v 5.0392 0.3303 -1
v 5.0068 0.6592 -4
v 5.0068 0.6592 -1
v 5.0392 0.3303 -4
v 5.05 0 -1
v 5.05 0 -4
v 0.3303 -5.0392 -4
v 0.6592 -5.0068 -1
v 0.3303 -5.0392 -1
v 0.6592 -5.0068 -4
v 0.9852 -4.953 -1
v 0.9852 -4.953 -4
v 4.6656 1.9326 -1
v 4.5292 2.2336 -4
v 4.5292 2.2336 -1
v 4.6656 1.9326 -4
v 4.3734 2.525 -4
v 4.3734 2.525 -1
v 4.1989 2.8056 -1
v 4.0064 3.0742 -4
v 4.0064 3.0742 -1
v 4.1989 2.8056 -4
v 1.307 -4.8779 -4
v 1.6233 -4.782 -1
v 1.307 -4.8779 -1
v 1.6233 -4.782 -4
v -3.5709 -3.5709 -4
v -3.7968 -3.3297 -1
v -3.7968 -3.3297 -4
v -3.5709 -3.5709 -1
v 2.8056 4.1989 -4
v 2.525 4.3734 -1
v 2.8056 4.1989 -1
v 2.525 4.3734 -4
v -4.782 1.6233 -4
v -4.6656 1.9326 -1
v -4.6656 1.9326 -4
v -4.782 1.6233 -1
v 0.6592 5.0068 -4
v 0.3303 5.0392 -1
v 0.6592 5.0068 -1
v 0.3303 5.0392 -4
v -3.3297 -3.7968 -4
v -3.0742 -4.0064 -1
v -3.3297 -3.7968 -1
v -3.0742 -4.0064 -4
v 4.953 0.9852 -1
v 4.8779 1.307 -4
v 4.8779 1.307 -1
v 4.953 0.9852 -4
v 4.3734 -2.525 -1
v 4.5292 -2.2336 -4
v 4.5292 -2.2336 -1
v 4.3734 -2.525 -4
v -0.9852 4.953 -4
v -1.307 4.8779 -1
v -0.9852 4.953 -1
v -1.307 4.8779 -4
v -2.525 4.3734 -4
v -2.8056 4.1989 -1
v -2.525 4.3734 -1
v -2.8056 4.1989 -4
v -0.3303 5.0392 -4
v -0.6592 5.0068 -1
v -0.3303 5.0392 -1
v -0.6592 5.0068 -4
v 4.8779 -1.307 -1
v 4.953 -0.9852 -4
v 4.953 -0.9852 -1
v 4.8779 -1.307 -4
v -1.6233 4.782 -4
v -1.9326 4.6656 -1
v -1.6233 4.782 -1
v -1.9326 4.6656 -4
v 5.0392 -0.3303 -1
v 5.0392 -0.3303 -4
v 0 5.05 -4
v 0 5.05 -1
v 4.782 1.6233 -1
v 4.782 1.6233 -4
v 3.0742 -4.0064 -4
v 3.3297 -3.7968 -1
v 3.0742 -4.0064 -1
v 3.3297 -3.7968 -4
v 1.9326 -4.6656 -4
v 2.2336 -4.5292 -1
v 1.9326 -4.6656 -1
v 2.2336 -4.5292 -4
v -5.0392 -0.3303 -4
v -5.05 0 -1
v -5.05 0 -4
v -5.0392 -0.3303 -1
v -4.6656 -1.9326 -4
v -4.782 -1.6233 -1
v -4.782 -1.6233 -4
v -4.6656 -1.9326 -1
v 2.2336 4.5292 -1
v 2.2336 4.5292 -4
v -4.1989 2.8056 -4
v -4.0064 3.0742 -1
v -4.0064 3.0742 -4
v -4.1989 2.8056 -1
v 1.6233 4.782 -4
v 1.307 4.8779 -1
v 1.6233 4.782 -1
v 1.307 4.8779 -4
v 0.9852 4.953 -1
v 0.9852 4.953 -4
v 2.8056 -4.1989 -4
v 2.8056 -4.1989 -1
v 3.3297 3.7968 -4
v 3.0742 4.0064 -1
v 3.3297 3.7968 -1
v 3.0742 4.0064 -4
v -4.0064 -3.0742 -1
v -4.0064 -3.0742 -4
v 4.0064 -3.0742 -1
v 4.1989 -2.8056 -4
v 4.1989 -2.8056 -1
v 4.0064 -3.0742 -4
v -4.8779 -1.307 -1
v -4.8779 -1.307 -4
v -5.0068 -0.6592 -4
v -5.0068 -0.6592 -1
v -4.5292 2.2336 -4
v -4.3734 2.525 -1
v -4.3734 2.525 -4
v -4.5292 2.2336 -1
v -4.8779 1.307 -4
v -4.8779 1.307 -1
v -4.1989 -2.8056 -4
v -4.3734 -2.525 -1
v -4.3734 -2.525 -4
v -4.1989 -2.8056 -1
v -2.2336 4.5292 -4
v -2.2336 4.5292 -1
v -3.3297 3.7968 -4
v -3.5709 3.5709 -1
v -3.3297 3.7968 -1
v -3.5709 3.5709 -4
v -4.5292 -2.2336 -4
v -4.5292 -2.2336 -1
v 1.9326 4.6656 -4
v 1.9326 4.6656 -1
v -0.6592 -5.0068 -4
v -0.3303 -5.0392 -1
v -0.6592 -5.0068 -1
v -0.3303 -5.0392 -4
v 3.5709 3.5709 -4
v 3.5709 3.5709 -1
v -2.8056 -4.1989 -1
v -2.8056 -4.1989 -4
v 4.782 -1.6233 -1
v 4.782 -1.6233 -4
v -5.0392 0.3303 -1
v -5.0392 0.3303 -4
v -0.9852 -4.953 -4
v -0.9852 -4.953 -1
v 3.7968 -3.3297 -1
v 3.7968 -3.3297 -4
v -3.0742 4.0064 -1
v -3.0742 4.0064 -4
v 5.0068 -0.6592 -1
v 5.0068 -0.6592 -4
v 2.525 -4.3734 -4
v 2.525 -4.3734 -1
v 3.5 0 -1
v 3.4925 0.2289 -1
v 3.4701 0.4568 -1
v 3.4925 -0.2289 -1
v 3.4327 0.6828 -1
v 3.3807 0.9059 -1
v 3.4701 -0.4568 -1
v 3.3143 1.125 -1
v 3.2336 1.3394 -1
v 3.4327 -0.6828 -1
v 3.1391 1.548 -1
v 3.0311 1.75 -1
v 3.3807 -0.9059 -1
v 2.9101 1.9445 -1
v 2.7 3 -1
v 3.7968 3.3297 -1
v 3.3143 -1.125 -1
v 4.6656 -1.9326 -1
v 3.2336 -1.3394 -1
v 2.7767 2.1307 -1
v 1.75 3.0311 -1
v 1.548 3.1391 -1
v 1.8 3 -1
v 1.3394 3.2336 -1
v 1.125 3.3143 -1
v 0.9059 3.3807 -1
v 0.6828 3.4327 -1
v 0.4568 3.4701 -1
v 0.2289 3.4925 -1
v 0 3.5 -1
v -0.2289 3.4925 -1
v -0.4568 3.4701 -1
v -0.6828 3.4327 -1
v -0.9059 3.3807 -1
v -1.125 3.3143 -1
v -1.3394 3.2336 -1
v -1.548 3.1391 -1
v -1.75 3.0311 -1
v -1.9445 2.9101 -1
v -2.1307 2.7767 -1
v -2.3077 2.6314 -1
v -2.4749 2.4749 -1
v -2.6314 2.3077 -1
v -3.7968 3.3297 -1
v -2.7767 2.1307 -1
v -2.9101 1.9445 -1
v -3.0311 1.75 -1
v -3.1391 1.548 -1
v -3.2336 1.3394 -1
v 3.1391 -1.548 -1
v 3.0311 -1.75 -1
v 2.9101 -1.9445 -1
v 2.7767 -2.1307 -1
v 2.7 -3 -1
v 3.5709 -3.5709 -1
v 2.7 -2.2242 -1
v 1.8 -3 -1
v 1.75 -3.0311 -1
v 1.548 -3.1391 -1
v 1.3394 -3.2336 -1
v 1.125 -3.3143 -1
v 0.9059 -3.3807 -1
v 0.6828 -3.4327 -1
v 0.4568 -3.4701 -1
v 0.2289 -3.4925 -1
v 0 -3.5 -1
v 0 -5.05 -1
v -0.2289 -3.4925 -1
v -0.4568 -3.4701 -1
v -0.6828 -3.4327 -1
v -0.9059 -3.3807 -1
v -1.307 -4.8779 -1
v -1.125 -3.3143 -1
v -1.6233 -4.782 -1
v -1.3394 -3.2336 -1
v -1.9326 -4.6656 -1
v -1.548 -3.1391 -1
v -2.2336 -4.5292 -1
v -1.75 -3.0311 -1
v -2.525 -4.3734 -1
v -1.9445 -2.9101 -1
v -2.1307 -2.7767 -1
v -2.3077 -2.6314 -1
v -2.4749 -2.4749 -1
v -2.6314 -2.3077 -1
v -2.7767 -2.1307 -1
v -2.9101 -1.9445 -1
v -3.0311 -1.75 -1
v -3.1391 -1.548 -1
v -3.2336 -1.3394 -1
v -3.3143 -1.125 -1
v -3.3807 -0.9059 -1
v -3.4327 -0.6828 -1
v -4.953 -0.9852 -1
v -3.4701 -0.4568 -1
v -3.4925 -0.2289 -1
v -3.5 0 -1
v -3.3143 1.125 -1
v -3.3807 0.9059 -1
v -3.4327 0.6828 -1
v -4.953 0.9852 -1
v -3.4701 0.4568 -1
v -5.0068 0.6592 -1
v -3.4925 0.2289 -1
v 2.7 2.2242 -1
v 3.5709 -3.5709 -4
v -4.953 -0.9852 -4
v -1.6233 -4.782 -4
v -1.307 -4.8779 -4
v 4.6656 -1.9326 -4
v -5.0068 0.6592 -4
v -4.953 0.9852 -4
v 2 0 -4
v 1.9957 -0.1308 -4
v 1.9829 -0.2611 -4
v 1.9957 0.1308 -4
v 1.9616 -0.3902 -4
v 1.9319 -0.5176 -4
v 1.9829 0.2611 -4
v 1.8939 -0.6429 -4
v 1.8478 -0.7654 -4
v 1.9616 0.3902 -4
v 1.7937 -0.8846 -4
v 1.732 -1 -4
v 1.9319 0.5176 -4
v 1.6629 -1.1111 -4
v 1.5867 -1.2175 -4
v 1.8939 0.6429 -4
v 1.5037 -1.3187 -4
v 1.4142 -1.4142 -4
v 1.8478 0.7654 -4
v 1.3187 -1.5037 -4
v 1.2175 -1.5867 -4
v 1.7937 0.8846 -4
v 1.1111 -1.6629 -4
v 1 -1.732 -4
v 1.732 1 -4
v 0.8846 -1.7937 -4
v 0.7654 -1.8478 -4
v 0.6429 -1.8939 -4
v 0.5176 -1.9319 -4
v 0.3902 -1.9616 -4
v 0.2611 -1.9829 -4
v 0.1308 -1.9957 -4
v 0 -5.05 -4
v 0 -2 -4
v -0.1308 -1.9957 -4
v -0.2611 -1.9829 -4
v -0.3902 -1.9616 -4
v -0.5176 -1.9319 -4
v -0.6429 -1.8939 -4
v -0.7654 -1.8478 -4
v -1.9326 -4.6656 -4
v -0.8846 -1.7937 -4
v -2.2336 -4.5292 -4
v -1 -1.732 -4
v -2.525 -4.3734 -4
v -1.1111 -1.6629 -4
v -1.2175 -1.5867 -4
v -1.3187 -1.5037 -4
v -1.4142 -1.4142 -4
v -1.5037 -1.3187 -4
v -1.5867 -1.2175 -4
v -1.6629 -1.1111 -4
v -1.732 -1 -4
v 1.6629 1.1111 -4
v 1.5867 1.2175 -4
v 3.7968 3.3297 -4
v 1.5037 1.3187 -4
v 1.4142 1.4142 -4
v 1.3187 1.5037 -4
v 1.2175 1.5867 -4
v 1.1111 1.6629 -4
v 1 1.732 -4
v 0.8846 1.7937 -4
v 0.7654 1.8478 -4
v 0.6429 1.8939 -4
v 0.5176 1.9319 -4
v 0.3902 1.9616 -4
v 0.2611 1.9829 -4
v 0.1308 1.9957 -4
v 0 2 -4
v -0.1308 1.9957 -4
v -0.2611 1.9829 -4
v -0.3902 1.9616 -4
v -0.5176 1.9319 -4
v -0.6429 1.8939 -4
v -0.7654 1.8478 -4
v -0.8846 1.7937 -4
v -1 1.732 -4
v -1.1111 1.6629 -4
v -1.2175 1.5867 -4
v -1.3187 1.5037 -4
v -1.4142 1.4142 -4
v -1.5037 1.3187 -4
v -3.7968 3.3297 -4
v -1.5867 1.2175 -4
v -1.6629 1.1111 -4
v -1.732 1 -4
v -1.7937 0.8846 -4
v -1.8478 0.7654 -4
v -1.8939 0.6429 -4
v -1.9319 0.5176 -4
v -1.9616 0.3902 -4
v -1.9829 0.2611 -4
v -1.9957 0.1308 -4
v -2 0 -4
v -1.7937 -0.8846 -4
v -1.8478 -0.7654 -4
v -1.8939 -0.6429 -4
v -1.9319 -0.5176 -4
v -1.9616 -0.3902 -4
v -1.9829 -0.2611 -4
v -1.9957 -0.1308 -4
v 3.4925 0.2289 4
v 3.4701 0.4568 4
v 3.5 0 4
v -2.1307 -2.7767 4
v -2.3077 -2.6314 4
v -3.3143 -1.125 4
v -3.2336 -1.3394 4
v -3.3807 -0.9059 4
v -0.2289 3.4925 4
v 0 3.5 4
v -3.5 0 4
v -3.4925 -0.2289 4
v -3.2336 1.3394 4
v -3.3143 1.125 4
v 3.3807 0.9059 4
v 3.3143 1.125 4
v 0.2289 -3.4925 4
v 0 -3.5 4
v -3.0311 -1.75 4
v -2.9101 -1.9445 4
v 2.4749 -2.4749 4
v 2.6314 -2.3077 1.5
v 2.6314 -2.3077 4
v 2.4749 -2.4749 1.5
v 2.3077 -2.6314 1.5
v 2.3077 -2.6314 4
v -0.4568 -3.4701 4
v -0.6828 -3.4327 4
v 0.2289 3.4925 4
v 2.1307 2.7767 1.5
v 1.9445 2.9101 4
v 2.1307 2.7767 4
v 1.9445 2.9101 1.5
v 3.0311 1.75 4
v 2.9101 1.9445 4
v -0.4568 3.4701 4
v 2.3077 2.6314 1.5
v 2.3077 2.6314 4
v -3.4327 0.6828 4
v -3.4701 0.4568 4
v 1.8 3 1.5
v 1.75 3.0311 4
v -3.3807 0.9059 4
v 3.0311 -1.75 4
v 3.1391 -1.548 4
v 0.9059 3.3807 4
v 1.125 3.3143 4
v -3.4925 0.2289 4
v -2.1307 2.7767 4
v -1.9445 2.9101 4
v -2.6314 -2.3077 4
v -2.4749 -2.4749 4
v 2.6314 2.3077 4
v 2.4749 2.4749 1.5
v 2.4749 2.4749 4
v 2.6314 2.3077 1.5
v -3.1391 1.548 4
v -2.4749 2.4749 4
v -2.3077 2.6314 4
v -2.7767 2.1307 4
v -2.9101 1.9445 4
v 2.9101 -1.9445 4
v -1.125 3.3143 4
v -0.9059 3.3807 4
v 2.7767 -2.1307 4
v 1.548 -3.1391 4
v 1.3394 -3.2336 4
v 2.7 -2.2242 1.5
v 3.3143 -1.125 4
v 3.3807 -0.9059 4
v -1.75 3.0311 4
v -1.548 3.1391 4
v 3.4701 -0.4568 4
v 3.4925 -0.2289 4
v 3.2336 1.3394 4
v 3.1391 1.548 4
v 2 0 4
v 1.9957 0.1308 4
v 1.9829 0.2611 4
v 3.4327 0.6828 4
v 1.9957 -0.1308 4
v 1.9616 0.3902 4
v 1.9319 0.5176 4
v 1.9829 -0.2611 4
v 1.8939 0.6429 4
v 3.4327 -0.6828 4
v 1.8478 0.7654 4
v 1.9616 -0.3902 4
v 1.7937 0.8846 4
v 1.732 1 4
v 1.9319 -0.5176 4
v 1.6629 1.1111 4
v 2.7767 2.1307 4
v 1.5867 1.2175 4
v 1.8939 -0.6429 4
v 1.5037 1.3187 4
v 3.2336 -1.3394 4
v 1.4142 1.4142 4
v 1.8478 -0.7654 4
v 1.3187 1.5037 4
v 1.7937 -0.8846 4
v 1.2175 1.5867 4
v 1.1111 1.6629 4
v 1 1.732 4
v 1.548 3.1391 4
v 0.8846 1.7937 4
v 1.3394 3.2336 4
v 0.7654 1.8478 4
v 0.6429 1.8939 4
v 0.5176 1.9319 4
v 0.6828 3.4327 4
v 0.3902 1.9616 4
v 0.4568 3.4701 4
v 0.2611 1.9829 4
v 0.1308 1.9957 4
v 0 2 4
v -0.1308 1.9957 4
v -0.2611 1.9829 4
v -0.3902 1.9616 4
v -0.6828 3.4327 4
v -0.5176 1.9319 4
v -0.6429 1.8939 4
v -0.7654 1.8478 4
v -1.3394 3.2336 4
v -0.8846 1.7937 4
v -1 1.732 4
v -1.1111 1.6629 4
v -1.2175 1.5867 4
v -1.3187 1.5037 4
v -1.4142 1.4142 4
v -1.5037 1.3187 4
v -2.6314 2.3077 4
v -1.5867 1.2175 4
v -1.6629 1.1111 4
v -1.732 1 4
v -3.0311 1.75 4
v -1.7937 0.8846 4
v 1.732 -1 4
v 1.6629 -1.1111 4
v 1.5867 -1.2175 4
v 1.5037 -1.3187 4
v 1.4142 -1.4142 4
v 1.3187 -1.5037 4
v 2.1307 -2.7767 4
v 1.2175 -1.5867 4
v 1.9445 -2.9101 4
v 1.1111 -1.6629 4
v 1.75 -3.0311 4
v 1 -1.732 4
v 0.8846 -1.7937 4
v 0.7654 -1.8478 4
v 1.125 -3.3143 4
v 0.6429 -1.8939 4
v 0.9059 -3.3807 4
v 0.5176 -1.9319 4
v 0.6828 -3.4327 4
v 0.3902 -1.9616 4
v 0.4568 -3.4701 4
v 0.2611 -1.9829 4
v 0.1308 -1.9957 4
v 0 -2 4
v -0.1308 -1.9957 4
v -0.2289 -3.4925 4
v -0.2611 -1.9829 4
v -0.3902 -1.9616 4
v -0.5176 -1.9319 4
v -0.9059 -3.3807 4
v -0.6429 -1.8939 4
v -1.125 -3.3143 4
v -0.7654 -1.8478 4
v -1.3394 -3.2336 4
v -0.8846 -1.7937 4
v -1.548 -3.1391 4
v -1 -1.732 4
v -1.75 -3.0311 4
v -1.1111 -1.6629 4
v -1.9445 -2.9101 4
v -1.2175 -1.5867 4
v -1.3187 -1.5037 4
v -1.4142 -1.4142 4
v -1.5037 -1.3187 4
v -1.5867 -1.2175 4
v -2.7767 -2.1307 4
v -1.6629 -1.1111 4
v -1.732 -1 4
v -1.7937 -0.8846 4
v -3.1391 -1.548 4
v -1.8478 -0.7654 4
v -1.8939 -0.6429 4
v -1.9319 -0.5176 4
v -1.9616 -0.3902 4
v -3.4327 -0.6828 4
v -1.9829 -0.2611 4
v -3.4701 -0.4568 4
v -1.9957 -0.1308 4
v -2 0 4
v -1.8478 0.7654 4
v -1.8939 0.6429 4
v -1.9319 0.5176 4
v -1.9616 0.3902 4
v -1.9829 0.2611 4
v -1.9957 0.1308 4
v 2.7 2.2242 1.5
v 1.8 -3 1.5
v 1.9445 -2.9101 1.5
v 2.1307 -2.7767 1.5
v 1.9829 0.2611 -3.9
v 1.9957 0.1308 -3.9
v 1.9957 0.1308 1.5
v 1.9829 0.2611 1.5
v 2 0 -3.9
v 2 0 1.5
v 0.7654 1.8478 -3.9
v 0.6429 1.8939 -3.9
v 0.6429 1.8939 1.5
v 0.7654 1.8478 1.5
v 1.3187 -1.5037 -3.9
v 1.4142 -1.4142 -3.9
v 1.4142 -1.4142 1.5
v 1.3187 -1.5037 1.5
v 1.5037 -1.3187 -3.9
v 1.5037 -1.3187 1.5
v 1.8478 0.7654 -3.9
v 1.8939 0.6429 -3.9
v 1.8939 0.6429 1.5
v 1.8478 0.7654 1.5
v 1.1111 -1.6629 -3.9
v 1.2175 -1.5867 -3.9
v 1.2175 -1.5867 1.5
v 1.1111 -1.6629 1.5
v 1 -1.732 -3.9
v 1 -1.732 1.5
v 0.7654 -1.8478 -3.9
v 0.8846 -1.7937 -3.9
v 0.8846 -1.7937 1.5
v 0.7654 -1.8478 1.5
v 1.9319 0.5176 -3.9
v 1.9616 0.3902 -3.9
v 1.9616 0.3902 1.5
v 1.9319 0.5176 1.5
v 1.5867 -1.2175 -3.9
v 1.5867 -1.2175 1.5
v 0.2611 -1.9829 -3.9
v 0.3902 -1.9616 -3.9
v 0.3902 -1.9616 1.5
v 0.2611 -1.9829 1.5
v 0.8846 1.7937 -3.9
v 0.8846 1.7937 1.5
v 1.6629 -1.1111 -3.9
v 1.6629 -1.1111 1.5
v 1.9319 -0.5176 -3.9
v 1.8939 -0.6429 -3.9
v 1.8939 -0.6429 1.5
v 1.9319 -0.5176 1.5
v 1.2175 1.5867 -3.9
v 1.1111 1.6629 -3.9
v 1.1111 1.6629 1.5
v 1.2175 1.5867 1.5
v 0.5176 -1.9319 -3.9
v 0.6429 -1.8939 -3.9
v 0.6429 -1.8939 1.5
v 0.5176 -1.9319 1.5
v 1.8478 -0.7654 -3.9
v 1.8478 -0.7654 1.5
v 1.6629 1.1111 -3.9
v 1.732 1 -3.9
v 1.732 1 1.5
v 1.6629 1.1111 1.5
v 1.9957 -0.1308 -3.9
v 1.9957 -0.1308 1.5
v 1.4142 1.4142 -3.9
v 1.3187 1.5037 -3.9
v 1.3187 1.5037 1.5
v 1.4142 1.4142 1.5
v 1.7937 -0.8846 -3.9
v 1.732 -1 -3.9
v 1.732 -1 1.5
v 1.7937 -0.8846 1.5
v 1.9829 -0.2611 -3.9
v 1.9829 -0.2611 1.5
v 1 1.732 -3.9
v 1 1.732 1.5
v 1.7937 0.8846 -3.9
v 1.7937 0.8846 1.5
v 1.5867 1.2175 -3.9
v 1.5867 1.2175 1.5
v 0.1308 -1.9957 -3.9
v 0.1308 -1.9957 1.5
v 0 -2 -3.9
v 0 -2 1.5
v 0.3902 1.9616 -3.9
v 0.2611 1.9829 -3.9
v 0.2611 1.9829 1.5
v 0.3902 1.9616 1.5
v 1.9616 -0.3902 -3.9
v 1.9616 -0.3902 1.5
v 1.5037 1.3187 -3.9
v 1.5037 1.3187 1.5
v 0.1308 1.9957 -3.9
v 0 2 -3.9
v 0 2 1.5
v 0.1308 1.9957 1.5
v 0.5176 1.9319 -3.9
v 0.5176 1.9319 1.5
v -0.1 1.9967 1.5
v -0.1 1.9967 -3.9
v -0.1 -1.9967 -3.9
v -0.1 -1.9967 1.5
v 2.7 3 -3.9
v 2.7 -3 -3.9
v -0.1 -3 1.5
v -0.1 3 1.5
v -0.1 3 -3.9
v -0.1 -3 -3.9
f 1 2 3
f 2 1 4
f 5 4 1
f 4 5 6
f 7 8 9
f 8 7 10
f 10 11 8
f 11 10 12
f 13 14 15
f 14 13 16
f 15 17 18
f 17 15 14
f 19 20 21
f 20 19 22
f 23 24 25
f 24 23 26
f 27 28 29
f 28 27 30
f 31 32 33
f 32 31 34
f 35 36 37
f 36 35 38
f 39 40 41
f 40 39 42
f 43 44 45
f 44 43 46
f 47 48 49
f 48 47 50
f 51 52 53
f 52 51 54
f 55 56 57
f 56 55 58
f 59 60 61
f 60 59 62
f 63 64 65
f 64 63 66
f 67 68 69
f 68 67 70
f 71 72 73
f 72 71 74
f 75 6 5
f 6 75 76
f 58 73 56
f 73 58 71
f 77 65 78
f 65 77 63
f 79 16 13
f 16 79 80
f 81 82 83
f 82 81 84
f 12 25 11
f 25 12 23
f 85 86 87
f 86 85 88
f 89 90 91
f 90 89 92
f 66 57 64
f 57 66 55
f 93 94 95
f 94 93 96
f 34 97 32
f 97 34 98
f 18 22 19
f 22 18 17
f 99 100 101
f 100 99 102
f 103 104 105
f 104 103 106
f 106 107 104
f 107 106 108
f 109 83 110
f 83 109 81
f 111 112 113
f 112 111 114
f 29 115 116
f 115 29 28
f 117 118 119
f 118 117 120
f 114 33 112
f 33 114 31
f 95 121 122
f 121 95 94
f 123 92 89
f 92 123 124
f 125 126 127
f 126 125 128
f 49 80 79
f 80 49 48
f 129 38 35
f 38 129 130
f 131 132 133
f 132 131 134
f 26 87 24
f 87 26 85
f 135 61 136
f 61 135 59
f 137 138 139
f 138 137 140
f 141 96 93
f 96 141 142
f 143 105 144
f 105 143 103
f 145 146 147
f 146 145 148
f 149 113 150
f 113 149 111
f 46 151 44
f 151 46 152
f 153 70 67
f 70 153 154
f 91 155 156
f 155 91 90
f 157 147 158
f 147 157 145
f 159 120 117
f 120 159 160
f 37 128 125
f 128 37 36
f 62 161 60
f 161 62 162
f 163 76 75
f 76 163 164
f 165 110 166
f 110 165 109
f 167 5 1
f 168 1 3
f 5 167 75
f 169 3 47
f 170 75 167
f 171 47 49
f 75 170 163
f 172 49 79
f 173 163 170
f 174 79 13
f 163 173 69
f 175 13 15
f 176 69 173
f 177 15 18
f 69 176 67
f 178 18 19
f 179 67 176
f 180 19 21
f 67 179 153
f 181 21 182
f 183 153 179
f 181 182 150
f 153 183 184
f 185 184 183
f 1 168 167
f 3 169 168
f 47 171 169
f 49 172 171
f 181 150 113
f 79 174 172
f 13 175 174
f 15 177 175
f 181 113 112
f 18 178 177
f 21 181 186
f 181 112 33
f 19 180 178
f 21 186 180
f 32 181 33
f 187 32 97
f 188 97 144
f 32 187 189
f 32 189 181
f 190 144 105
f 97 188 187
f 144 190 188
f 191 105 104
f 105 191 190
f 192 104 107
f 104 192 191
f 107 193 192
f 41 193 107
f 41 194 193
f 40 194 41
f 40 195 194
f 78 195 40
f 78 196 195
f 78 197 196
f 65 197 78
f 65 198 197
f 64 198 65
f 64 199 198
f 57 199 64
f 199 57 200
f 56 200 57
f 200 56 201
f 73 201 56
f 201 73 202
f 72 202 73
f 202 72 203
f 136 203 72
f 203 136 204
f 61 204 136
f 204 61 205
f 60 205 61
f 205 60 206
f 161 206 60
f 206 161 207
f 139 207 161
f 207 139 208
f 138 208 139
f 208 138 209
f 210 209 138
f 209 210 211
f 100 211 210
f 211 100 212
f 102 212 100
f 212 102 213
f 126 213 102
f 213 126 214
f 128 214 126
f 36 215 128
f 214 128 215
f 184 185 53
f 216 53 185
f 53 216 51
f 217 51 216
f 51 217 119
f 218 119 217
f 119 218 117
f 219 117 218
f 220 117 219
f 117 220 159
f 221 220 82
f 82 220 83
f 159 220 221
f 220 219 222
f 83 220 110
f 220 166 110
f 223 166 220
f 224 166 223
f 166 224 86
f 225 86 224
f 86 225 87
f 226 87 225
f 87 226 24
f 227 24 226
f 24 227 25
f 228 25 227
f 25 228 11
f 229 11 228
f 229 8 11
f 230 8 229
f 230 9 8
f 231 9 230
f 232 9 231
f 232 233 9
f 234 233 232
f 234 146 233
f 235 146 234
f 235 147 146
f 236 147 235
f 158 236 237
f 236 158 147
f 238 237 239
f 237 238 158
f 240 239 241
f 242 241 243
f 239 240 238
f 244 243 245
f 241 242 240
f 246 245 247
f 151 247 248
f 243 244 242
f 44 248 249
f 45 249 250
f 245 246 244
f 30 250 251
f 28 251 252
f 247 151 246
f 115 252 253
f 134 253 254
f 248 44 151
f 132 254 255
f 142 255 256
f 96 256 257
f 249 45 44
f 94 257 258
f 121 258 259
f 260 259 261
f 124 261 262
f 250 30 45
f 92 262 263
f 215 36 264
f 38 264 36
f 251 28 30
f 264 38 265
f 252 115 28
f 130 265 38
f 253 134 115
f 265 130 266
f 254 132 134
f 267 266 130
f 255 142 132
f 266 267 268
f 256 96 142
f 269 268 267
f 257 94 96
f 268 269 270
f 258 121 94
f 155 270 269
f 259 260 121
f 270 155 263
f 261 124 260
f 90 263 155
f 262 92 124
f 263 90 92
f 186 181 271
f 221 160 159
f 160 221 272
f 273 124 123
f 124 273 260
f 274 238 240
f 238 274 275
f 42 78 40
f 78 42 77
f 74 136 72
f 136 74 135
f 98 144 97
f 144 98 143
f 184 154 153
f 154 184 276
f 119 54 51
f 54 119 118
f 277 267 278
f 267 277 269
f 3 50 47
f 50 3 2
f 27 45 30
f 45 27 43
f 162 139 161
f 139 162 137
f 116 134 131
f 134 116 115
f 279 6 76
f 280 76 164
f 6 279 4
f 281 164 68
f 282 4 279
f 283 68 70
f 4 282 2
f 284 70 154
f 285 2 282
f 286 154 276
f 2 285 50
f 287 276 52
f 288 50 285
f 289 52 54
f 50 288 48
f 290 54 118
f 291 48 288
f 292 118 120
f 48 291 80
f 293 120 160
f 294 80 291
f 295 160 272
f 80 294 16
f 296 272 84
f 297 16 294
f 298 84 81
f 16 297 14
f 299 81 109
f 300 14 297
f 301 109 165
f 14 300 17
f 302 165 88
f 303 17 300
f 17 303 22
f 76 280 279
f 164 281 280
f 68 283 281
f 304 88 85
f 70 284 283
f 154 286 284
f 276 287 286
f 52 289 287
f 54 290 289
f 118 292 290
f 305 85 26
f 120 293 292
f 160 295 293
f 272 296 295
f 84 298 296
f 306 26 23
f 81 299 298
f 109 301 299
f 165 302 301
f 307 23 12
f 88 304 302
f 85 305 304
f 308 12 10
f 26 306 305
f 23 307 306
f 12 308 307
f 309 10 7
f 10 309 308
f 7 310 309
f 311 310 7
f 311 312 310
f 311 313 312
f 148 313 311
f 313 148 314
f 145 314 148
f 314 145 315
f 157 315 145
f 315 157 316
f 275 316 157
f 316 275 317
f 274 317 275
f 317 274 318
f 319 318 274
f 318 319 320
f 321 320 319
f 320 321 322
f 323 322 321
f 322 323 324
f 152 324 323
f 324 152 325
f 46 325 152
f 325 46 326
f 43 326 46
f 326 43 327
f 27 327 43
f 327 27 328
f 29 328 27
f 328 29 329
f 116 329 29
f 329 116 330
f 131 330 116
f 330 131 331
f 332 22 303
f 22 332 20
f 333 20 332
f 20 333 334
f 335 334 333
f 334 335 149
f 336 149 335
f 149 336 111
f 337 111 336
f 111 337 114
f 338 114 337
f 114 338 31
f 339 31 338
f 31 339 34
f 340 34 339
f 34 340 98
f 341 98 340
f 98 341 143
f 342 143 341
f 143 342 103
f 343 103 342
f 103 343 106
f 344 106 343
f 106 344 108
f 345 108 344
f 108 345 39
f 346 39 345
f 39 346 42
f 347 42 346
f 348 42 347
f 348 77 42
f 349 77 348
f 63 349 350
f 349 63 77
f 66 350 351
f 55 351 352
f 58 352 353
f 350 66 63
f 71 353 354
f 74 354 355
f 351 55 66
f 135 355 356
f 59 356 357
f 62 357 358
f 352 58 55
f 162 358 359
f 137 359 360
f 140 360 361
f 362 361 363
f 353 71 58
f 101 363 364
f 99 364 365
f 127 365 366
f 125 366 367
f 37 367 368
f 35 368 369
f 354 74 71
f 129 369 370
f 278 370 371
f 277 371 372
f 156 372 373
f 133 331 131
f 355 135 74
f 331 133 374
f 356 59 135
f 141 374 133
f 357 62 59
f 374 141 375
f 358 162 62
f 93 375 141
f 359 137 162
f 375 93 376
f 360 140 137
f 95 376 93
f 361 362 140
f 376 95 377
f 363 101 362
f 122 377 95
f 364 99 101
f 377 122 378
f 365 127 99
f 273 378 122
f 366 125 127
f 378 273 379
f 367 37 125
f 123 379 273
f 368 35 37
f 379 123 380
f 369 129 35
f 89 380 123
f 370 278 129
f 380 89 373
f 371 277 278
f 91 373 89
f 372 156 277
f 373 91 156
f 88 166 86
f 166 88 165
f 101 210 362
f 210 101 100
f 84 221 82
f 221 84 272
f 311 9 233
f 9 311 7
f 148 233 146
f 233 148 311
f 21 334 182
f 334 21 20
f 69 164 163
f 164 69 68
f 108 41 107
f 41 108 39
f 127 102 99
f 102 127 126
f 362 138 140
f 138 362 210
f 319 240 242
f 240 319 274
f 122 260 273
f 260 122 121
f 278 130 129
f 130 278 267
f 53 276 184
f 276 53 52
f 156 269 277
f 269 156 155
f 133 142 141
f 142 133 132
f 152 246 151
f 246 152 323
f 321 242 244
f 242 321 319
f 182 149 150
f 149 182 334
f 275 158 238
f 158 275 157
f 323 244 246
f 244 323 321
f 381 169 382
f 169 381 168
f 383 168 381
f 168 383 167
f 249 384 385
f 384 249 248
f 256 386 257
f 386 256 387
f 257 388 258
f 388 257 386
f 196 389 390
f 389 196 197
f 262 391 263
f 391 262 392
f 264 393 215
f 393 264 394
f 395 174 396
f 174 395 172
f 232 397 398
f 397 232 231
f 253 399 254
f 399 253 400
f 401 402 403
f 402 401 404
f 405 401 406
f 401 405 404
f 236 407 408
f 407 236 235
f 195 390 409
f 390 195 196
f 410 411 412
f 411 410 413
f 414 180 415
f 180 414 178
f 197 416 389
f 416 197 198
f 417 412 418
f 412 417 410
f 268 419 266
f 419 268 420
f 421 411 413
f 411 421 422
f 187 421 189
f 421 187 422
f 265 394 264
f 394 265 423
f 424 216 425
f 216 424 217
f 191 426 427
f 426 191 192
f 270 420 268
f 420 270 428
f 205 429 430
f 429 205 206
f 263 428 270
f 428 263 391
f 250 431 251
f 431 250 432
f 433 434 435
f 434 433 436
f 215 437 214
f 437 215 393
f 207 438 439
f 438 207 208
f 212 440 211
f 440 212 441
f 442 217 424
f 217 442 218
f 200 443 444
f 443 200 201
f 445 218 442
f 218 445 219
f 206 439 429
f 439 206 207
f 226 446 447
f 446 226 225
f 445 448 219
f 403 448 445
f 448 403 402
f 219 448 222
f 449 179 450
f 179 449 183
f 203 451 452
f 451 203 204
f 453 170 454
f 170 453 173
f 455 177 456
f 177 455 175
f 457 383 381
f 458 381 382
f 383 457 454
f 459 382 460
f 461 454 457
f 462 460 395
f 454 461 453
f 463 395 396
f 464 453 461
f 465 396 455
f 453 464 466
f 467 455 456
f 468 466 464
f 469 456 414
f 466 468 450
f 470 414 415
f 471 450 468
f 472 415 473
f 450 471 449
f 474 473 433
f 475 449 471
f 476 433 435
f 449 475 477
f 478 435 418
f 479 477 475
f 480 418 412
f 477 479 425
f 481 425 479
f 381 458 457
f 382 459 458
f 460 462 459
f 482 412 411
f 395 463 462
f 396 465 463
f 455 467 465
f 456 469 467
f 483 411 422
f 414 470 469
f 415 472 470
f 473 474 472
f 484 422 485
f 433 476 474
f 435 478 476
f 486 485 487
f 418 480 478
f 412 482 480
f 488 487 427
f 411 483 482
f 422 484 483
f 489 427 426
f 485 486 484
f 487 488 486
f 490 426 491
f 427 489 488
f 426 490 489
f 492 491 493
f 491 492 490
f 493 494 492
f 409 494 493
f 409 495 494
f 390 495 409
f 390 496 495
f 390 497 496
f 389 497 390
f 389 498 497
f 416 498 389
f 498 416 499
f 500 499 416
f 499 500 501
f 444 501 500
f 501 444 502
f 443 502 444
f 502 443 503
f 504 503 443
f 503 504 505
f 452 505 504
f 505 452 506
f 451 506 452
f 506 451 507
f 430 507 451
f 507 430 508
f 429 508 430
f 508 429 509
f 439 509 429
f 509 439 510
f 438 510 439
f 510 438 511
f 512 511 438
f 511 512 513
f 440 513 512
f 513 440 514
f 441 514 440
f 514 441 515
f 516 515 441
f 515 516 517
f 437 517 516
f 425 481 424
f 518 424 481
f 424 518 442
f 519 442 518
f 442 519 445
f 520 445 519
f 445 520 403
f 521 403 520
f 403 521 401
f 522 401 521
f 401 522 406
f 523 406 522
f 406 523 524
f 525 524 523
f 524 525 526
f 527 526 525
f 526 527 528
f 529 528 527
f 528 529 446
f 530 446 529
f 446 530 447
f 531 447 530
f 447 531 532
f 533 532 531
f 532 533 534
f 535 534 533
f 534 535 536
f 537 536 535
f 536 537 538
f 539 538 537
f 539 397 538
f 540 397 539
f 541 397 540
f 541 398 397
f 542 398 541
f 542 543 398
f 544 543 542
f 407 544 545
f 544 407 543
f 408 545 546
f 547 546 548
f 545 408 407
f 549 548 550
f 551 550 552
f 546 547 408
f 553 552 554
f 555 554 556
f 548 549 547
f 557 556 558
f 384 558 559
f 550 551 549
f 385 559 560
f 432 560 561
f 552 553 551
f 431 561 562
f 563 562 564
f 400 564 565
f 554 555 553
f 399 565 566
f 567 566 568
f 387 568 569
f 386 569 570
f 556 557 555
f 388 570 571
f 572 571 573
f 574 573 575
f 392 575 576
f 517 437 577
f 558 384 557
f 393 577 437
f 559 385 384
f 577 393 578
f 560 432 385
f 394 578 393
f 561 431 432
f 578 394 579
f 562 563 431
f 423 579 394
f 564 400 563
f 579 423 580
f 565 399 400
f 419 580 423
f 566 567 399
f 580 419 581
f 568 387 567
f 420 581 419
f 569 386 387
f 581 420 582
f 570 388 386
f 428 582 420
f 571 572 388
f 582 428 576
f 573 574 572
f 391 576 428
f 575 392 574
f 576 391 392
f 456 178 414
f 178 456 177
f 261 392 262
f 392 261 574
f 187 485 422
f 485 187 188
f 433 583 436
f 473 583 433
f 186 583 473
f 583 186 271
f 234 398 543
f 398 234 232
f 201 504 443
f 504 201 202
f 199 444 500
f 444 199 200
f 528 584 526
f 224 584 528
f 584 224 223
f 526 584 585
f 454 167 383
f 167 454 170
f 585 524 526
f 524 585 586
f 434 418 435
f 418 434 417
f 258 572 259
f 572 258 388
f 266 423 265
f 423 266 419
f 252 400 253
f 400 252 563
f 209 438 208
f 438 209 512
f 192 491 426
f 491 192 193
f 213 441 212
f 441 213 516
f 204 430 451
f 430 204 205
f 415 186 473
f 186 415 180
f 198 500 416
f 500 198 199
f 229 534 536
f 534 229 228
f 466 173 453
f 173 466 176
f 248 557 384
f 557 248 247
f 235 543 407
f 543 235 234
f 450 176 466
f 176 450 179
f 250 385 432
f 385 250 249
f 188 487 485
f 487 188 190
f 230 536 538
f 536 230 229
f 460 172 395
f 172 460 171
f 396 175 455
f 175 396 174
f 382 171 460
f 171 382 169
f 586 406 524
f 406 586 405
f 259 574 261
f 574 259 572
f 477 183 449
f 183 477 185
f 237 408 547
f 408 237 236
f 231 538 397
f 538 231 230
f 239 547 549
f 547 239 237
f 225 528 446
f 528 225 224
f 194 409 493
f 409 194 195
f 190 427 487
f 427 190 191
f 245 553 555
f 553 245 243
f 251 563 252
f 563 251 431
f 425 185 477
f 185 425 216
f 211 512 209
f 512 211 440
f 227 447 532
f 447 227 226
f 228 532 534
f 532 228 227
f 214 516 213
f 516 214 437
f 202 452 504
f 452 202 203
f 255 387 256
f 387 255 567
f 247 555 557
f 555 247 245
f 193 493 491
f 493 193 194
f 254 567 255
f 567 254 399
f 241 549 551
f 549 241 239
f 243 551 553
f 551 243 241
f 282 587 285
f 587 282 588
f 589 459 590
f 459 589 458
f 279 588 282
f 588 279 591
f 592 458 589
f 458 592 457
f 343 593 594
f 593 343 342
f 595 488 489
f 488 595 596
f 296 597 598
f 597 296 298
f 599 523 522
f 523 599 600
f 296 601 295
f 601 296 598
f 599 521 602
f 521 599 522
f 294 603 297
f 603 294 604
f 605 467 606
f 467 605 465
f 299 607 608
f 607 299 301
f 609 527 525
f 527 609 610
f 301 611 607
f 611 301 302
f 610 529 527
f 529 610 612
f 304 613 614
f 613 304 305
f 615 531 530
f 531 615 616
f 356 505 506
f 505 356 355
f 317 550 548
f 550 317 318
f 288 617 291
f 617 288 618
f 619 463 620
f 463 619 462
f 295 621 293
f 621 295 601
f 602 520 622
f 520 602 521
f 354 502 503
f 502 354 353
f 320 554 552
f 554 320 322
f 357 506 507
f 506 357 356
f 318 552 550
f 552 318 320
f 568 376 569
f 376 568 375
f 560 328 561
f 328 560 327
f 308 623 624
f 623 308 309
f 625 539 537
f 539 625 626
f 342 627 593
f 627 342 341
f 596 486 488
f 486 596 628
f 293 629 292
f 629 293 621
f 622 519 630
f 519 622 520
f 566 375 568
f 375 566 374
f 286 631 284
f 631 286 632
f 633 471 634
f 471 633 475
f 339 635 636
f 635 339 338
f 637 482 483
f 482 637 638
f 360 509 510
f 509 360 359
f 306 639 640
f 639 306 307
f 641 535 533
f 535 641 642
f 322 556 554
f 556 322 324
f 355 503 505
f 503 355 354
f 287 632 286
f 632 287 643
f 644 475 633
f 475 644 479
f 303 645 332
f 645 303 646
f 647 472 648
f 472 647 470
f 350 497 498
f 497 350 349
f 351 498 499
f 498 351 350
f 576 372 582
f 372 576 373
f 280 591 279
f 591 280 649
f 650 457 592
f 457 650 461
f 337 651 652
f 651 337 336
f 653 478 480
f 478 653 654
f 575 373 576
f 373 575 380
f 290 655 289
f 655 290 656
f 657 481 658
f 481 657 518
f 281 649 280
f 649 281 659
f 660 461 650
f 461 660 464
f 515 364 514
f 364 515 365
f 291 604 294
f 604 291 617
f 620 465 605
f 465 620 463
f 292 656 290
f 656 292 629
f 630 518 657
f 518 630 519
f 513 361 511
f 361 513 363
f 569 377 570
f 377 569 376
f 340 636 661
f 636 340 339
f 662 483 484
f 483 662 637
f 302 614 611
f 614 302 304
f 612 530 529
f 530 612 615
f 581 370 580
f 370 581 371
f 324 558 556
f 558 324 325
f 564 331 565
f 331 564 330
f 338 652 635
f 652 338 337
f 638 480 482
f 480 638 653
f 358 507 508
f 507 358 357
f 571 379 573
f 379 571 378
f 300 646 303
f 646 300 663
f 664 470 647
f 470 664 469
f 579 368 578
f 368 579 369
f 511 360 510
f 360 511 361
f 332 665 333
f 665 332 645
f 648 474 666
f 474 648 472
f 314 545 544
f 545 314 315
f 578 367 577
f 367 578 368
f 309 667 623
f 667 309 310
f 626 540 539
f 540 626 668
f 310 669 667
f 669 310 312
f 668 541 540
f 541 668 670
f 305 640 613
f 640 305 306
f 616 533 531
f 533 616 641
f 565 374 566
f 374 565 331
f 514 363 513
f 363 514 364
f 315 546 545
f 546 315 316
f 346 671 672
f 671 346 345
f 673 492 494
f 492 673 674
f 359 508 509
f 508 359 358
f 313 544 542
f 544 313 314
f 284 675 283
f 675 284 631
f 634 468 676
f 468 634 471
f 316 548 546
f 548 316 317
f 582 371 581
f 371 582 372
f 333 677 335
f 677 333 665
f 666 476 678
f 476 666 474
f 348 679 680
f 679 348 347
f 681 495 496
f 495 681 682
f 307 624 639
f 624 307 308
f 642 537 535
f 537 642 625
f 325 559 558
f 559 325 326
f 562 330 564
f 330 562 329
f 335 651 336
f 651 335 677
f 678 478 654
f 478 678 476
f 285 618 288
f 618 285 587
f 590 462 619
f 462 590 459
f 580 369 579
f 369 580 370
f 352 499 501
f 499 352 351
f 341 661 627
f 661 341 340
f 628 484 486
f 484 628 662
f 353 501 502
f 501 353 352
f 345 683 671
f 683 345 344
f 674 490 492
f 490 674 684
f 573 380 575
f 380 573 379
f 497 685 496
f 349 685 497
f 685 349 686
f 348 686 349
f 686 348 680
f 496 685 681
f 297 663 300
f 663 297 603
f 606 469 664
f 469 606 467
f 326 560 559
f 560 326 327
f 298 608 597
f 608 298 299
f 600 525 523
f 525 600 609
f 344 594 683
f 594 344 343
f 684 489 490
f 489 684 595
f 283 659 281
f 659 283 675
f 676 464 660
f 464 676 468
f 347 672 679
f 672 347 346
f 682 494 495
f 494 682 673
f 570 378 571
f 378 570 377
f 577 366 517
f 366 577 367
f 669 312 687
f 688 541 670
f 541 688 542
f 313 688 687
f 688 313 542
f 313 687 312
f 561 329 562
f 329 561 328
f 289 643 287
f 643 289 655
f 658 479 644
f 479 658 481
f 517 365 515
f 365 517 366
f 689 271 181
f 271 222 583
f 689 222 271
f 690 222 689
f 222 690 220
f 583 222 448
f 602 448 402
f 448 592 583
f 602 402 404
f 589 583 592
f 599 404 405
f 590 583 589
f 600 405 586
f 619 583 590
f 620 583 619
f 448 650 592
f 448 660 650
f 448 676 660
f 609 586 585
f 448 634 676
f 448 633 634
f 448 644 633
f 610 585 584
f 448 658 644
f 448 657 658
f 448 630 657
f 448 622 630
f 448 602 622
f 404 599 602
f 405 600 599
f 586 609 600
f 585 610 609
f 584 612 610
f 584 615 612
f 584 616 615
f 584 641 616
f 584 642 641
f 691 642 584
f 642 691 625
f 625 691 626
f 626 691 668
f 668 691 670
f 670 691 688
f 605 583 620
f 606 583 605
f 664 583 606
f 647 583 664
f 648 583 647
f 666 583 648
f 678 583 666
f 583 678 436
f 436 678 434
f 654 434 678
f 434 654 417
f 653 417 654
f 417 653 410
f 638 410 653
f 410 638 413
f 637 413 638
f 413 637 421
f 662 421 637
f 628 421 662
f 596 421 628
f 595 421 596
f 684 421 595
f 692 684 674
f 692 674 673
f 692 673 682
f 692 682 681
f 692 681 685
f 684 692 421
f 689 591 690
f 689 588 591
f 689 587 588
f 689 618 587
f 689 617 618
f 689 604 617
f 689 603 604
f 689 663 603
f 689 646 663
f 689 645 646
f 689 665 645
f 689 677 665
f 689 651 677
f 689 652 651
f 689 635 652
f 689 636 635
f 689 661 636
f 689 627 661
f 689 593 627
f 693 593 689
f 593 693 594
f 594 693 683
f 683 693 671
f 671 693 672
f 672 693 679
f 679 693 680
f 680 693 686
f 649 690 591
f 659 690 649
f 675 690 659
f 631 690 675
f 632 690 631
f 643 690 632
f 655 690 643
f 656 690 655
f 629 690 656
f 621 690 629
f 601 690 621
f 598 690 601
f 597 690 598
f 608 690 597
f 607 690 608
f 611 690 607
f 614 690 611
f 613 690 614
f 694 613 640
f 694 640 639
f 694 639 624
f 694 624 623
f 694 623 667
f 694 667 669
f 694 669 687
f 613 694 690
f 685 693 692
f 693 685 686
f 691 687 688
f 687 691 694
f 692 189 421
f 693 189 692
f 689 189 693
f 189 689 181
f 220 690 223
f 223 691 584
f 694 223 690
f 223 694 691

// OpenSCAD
$fn=96;

bbox_x = 10.1;
bbox_y = 10.2;
bbox_z = 8.0;

flange_d = 10.1;
flange_h = 3.0;

boss_d = 7.0;
boss_h = bbox_z - flange_h;

bore_d = 4.0;

flat_depth = 2.2;
flat_width = 6.0;

module stepped_bushing() {
    difference() {
        union() {
            translate([0,0,-bbox_z/2])
                cylinder(d=flange_d, h=flange_h);
            translate([0,0,-bbox_z/2 + flange_h])
                cylinder(d=boss_d, h=boss_h);
        }

        translate([0,0,-bbox_z/2 - 0.2])
            cylinder(d=bore_d, h=bbox_z + 0.4);

        translate([boss_d/2 - flat_depth, 0, -bbox_z/2 + flange_h - 0.2])
            cube([flat_depth + 0.6, flat_width, boss_h + 0.4], center=true);
    }
}

stepped_bushing();
